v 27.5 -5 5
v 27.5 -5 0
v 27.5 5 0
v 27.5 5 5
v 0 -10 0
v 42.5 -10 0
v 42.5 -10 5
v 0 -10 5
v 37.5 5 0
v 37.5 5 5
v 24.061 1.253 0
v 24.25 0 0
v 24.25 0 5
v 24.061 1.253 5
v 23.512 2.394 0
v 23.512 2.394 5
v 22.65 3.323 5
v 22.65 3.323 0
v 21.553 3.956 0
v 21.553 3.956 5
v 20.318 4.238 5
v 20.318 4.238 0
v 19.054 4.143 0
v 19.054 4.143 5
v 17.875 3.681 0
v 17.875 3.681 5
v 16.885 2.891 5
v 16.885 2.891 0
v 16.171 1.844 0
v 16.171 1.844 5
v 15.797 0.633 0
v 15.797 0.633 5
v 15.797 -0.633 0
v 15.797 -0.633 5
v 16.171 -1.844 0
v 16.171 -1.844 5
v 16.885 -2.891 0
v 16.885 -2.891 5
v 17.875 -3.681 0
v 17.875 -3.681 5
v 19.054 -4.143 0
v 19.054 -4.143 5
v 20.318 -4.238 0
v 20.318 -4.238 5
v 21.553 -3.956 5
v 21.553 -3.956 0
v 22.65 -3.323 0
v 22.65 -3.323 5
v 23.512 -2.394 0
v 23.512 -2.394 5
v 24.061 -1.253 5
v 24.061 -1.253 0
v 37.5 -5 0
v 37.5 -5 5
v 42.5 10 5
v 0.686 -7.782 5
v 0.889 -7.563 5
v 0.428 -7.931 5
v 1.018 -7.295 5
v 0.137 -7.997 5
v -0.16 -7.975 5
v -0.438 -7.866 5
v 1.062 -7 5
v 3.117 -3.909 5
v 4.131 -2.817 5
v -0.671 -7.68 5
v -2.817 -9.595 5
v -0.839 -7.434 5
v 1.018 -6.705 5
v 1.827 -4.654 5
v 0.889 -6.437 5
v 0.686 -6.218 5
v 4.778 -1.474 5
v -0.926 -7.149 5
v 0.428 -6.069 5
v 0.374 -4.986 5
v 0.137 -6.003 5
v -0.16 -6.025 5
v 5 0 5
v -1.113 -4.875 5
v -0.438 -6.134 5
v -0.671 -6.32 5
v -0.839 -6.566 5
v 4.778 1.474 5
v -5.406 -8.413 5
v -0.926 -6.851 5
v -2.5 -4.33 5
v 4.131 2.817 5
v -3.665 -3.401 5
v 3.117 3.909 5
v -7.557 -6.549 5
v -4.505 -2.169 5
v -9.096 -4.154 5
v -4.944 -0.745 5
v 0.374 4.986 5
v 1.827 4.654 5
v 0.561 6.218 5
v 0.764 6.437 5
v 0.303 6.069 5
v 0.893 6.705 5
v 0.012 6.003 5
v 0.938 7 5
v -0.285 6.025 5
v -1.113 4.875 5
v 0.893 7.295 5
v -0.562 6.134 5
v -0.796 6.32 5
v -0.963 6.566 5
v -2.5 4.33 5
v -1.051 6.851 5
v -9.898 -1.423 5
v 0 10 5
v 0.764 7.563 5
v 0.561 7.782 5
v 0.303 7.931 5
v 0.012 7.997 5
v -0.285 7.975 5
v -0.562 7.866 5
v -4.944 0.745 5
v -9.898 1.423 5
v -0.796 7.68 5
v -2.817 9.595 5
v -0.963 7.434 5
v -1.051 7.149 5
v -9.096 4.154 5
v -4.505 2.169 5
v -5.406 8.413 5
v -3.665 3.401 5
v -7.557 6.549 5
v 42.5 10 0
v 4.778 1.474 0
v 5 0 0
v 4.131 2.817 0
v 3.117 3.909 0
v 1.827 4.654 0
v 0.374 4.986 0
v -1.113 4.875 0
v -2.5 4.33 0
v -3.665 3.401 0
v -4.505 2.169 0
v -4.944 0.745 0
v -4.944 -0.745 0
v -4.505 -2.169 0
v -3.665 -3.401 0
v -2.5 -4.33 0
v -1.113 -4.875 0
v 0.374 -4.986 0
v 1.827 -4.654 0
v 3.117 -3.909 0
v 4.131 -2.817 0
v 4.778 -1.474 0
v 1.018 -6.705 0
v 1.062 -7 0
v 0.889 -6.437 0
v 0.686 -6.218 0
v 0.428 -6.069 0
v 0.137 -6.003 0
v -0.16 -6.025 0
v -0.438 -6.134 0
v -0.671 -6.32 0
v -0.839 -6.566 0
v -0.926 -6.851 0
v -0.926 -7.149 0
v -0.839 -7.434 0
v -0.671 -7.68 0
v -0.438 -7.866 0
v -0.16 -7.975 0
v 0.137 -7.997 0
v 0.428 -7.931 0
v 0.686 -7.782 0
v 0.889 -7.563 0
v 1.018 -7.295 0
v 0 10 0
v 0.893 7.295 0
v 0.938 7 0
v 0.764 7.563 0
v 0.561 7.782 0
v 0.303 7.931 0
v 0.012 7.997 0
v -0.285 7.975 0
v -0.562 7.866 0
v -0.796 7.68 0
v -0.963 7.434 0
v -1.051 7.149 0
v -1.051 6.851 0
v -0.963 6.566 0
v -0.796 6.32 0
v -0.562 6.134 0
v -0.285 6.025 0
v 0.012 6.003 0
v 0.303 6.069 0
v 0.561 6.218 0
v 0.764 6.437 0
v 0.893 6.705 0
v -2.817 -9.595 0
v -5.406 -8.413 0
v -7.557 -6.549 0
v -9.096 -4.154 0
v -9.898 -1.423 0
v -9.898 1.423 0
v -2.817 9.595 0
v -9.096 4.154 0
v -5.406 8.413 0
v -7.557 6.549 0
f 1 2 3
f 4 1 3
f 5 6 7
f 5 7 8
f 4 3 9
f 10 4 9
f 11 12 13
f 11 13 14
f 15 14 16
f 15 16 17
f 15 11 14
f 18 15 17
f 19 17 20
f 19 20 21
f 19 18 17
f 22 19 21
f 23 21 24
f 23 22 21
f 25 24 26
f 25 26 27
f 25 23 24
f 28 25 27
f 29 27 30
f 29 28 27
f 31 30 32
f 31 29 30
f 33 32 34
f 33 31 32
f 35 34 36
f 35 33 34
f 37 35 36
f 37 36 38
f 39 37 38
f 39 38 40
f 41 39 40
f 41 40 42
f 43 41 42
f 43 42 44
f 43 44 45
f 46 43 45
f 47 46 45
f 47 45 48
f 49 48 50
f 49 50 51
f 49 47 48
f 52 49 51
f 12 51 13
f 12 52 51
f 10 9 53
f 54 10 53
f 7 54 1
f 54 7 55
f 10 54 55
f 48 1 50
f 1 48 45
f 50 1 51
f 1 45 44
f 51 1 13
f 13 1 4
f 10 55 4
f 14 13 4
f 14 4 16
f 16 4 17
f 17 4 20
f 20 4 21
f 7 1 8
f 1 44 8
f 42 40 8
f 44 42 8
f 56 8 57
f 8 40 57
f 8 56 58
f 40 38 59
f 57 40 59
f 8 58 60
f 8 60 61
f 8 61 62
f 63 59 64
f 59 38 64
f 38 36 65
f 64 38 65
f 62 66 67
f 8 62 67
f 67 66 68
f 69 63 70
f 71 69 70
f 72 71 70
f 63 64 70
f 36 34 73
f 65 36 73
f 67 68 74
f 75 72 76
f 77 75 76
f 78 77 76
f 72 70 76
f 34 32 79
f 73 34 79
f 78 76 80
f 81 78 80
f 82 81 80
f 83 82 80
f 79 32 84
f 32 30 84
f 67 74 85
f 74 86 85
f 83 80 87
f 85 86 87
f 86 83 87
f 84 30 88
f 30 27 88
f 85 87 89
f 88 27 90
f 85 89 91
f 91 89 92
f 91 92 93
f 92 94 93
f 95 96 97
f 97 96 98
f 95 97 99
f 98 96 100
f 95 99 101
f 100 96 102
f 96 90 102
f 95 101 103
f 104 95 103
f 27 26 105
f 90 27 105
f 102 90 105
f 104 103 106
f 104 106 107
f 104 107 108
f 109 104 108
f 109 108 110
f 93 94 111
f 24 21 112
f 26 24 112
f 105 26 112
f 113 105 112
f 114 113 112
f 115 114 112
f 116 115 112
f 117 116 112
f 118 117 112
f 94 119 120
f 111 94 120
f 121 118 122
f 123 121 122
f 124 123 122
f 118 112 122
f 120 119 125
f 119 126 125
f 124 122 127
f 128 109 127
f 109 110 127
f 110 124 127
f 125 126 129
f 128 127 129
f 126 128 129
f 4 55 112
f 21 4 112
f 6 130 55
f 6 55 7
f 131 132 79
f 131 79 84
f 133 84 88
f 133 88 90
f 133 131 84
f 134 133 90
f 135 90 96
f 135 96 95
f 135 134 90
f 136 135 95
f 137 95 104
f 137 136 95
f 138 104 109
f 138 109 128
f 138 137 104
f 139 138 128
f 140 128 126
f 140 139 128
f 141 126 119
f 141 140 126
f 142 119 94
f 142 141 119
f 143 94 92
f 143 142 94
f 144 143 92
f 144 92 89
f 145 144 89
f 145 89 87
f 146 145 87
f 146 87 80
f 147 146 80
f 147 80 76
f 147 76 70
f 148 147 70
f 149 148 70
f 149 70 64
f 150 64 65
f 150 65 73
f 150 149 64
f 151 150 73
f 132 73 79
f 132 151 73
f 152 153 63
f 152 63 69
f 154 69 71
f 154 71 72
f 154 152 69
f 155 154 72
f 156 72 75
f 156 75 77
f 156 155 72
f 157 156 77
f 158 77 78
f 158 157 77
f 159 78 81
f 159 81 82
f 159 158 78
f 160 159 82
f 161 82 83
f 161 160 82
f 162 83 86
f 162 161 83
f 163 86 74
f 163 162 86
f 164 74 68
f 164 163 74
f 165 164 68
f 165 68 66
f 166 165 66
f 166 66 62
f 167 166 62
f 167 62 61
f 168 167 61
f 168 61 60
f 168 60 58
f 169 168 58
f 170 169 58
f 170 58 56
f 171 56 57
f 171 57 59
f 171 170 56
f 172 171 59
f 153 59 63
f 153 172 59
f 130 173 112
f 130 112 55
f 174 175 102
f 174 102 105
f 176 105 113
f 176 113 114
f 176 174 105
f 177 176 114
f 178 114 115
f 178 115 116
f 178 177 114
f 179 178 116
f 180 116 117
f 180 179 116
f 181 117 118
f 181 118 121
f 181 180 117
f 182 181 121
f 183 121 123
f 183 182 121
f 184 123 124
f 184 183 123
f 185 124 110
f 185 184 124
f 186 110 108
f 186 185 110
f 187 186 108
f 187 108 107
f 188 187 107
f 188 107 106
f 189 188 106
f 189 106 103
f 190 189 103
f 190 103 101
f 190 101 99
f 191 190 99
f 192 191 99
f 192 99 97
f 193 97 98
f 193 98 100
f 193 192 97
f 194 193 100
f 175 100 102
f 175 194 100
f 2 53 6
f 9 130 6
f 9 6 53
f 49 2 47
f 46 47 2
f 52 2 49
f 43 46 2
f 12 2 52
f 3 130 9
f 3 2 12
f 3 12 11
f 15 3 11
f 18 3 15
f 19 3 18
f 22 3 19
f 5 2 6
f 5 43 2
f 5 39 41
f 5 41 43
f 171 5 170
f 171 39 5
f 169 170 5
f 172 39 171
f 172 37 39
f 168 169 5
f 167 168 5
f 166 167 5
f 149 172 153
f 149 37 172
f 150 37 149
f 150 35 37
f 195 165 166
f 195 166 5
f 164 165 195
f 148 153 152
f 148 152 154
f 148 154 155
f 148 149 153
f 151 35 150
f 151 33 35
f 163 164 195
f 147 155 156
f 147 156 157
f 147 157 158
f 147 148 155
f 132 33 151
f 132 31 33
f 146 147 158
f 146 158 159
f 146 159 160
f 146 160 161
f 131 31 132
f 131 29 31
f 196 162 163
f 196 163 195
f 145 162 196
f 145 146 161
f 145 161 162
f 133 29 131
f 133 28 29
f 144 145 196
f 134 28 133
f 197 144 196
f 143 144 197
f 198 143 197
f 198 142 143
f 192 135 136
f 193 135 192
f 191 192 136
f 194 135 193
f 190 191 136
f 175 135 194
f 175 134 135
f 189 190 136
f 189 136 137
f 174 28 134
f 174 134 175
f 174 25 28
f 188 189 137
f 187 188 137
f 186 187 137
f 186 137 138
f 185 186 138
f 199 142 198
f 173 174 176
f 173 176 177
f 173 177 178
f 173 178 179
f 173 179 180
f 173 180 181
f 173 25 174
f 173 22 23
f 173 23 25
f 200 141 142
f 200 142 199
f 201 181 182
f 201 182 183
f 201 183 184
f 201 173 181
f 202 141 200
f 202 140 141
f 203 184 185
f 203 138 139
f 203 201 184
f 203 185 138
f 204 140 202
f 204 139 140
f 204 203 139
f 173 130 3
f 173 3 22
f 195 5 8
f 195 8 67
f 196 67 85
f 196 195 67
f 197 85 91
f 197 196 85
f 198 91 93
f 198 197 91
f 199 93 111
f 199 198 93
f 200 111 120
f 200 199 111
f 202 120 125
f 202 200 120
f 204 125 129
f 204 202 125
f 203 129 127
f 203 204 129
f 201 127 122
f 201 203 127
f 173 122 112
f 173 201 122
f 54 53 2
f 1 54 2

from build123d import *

# Parameters (mm, degrees)
SKETCH1_R           = 4.25
SKETCH1_R_2         = 5
SKETCH1_R_3         = 1
BOSS_EXTRUDE1_DEPTH = 5
SKETCH2_R           = 1
SKETCH2_R_2         = 1.224011965
BOSS_EXTRUDE2_DEPTH = 5


with BuildPart() as part:
    # Sketch1 → Boss-Extrude1 (new body)
    with BuildSketch(Plane.XY):
        with BuildLine():
            Line((0, 10), (42.5, 10))
            Line((42.5, 10), (42.5, -10))
            Line((42.5, -10), (0, -10))
            ThreePointArc((0, -10), (-10, 0), (0, 10))
        make_face()
        with Locations((20, 0)):
            Circle(SKETCH1_R, mode=Mode.SUBTRACT)
        Circle(SKETCH1_R_2, mode=Mode.SUBTRACT)
        with Locations((7, 0.062454575)):
            Circle(SKETCH1_R_3, mode=Mode.SUBTRACT)
        with Locations((0.062454575, -7)):
            Circle(SKETCH1_R_3, mode=Mode.SUBTRACT)
        with Locations((-7, -0.062454575)):
            Circle(SKETCH1_R_3, mode=Mode.SUBTRACT)
        with Locations((-0.062454575, 7)):
            Circle(SKETCH1_R_3, mode=Mode.SUBTRACT)
        Polygon((27.5, 5), (32.5, 5), (37.5, 5), (37.5, -5), (32.5, -5), (27.5, -5), (27.5, 0), align=None, mode=Mode.SUBTRACT)
    extrude(amount=BOSS_EXTRUDE1_DEPTH)

    # Sketch2 → Boss-Extrude2 (add)
    with BuildSketch(Plane(origin=(0, 0, 0), x_dir=(-1, 0, 0), z_dir=(0, 0, -1))):
        with Locations((7, -0.062454575)):
            Circle(SKETCH2_R)
        with Locations((-7, 0.062454575)):
            Circle(SKETCH2_R_2)
    extrude(amount=-BOSS_EXTRUDE2_DEPTH)


solid = part.part
